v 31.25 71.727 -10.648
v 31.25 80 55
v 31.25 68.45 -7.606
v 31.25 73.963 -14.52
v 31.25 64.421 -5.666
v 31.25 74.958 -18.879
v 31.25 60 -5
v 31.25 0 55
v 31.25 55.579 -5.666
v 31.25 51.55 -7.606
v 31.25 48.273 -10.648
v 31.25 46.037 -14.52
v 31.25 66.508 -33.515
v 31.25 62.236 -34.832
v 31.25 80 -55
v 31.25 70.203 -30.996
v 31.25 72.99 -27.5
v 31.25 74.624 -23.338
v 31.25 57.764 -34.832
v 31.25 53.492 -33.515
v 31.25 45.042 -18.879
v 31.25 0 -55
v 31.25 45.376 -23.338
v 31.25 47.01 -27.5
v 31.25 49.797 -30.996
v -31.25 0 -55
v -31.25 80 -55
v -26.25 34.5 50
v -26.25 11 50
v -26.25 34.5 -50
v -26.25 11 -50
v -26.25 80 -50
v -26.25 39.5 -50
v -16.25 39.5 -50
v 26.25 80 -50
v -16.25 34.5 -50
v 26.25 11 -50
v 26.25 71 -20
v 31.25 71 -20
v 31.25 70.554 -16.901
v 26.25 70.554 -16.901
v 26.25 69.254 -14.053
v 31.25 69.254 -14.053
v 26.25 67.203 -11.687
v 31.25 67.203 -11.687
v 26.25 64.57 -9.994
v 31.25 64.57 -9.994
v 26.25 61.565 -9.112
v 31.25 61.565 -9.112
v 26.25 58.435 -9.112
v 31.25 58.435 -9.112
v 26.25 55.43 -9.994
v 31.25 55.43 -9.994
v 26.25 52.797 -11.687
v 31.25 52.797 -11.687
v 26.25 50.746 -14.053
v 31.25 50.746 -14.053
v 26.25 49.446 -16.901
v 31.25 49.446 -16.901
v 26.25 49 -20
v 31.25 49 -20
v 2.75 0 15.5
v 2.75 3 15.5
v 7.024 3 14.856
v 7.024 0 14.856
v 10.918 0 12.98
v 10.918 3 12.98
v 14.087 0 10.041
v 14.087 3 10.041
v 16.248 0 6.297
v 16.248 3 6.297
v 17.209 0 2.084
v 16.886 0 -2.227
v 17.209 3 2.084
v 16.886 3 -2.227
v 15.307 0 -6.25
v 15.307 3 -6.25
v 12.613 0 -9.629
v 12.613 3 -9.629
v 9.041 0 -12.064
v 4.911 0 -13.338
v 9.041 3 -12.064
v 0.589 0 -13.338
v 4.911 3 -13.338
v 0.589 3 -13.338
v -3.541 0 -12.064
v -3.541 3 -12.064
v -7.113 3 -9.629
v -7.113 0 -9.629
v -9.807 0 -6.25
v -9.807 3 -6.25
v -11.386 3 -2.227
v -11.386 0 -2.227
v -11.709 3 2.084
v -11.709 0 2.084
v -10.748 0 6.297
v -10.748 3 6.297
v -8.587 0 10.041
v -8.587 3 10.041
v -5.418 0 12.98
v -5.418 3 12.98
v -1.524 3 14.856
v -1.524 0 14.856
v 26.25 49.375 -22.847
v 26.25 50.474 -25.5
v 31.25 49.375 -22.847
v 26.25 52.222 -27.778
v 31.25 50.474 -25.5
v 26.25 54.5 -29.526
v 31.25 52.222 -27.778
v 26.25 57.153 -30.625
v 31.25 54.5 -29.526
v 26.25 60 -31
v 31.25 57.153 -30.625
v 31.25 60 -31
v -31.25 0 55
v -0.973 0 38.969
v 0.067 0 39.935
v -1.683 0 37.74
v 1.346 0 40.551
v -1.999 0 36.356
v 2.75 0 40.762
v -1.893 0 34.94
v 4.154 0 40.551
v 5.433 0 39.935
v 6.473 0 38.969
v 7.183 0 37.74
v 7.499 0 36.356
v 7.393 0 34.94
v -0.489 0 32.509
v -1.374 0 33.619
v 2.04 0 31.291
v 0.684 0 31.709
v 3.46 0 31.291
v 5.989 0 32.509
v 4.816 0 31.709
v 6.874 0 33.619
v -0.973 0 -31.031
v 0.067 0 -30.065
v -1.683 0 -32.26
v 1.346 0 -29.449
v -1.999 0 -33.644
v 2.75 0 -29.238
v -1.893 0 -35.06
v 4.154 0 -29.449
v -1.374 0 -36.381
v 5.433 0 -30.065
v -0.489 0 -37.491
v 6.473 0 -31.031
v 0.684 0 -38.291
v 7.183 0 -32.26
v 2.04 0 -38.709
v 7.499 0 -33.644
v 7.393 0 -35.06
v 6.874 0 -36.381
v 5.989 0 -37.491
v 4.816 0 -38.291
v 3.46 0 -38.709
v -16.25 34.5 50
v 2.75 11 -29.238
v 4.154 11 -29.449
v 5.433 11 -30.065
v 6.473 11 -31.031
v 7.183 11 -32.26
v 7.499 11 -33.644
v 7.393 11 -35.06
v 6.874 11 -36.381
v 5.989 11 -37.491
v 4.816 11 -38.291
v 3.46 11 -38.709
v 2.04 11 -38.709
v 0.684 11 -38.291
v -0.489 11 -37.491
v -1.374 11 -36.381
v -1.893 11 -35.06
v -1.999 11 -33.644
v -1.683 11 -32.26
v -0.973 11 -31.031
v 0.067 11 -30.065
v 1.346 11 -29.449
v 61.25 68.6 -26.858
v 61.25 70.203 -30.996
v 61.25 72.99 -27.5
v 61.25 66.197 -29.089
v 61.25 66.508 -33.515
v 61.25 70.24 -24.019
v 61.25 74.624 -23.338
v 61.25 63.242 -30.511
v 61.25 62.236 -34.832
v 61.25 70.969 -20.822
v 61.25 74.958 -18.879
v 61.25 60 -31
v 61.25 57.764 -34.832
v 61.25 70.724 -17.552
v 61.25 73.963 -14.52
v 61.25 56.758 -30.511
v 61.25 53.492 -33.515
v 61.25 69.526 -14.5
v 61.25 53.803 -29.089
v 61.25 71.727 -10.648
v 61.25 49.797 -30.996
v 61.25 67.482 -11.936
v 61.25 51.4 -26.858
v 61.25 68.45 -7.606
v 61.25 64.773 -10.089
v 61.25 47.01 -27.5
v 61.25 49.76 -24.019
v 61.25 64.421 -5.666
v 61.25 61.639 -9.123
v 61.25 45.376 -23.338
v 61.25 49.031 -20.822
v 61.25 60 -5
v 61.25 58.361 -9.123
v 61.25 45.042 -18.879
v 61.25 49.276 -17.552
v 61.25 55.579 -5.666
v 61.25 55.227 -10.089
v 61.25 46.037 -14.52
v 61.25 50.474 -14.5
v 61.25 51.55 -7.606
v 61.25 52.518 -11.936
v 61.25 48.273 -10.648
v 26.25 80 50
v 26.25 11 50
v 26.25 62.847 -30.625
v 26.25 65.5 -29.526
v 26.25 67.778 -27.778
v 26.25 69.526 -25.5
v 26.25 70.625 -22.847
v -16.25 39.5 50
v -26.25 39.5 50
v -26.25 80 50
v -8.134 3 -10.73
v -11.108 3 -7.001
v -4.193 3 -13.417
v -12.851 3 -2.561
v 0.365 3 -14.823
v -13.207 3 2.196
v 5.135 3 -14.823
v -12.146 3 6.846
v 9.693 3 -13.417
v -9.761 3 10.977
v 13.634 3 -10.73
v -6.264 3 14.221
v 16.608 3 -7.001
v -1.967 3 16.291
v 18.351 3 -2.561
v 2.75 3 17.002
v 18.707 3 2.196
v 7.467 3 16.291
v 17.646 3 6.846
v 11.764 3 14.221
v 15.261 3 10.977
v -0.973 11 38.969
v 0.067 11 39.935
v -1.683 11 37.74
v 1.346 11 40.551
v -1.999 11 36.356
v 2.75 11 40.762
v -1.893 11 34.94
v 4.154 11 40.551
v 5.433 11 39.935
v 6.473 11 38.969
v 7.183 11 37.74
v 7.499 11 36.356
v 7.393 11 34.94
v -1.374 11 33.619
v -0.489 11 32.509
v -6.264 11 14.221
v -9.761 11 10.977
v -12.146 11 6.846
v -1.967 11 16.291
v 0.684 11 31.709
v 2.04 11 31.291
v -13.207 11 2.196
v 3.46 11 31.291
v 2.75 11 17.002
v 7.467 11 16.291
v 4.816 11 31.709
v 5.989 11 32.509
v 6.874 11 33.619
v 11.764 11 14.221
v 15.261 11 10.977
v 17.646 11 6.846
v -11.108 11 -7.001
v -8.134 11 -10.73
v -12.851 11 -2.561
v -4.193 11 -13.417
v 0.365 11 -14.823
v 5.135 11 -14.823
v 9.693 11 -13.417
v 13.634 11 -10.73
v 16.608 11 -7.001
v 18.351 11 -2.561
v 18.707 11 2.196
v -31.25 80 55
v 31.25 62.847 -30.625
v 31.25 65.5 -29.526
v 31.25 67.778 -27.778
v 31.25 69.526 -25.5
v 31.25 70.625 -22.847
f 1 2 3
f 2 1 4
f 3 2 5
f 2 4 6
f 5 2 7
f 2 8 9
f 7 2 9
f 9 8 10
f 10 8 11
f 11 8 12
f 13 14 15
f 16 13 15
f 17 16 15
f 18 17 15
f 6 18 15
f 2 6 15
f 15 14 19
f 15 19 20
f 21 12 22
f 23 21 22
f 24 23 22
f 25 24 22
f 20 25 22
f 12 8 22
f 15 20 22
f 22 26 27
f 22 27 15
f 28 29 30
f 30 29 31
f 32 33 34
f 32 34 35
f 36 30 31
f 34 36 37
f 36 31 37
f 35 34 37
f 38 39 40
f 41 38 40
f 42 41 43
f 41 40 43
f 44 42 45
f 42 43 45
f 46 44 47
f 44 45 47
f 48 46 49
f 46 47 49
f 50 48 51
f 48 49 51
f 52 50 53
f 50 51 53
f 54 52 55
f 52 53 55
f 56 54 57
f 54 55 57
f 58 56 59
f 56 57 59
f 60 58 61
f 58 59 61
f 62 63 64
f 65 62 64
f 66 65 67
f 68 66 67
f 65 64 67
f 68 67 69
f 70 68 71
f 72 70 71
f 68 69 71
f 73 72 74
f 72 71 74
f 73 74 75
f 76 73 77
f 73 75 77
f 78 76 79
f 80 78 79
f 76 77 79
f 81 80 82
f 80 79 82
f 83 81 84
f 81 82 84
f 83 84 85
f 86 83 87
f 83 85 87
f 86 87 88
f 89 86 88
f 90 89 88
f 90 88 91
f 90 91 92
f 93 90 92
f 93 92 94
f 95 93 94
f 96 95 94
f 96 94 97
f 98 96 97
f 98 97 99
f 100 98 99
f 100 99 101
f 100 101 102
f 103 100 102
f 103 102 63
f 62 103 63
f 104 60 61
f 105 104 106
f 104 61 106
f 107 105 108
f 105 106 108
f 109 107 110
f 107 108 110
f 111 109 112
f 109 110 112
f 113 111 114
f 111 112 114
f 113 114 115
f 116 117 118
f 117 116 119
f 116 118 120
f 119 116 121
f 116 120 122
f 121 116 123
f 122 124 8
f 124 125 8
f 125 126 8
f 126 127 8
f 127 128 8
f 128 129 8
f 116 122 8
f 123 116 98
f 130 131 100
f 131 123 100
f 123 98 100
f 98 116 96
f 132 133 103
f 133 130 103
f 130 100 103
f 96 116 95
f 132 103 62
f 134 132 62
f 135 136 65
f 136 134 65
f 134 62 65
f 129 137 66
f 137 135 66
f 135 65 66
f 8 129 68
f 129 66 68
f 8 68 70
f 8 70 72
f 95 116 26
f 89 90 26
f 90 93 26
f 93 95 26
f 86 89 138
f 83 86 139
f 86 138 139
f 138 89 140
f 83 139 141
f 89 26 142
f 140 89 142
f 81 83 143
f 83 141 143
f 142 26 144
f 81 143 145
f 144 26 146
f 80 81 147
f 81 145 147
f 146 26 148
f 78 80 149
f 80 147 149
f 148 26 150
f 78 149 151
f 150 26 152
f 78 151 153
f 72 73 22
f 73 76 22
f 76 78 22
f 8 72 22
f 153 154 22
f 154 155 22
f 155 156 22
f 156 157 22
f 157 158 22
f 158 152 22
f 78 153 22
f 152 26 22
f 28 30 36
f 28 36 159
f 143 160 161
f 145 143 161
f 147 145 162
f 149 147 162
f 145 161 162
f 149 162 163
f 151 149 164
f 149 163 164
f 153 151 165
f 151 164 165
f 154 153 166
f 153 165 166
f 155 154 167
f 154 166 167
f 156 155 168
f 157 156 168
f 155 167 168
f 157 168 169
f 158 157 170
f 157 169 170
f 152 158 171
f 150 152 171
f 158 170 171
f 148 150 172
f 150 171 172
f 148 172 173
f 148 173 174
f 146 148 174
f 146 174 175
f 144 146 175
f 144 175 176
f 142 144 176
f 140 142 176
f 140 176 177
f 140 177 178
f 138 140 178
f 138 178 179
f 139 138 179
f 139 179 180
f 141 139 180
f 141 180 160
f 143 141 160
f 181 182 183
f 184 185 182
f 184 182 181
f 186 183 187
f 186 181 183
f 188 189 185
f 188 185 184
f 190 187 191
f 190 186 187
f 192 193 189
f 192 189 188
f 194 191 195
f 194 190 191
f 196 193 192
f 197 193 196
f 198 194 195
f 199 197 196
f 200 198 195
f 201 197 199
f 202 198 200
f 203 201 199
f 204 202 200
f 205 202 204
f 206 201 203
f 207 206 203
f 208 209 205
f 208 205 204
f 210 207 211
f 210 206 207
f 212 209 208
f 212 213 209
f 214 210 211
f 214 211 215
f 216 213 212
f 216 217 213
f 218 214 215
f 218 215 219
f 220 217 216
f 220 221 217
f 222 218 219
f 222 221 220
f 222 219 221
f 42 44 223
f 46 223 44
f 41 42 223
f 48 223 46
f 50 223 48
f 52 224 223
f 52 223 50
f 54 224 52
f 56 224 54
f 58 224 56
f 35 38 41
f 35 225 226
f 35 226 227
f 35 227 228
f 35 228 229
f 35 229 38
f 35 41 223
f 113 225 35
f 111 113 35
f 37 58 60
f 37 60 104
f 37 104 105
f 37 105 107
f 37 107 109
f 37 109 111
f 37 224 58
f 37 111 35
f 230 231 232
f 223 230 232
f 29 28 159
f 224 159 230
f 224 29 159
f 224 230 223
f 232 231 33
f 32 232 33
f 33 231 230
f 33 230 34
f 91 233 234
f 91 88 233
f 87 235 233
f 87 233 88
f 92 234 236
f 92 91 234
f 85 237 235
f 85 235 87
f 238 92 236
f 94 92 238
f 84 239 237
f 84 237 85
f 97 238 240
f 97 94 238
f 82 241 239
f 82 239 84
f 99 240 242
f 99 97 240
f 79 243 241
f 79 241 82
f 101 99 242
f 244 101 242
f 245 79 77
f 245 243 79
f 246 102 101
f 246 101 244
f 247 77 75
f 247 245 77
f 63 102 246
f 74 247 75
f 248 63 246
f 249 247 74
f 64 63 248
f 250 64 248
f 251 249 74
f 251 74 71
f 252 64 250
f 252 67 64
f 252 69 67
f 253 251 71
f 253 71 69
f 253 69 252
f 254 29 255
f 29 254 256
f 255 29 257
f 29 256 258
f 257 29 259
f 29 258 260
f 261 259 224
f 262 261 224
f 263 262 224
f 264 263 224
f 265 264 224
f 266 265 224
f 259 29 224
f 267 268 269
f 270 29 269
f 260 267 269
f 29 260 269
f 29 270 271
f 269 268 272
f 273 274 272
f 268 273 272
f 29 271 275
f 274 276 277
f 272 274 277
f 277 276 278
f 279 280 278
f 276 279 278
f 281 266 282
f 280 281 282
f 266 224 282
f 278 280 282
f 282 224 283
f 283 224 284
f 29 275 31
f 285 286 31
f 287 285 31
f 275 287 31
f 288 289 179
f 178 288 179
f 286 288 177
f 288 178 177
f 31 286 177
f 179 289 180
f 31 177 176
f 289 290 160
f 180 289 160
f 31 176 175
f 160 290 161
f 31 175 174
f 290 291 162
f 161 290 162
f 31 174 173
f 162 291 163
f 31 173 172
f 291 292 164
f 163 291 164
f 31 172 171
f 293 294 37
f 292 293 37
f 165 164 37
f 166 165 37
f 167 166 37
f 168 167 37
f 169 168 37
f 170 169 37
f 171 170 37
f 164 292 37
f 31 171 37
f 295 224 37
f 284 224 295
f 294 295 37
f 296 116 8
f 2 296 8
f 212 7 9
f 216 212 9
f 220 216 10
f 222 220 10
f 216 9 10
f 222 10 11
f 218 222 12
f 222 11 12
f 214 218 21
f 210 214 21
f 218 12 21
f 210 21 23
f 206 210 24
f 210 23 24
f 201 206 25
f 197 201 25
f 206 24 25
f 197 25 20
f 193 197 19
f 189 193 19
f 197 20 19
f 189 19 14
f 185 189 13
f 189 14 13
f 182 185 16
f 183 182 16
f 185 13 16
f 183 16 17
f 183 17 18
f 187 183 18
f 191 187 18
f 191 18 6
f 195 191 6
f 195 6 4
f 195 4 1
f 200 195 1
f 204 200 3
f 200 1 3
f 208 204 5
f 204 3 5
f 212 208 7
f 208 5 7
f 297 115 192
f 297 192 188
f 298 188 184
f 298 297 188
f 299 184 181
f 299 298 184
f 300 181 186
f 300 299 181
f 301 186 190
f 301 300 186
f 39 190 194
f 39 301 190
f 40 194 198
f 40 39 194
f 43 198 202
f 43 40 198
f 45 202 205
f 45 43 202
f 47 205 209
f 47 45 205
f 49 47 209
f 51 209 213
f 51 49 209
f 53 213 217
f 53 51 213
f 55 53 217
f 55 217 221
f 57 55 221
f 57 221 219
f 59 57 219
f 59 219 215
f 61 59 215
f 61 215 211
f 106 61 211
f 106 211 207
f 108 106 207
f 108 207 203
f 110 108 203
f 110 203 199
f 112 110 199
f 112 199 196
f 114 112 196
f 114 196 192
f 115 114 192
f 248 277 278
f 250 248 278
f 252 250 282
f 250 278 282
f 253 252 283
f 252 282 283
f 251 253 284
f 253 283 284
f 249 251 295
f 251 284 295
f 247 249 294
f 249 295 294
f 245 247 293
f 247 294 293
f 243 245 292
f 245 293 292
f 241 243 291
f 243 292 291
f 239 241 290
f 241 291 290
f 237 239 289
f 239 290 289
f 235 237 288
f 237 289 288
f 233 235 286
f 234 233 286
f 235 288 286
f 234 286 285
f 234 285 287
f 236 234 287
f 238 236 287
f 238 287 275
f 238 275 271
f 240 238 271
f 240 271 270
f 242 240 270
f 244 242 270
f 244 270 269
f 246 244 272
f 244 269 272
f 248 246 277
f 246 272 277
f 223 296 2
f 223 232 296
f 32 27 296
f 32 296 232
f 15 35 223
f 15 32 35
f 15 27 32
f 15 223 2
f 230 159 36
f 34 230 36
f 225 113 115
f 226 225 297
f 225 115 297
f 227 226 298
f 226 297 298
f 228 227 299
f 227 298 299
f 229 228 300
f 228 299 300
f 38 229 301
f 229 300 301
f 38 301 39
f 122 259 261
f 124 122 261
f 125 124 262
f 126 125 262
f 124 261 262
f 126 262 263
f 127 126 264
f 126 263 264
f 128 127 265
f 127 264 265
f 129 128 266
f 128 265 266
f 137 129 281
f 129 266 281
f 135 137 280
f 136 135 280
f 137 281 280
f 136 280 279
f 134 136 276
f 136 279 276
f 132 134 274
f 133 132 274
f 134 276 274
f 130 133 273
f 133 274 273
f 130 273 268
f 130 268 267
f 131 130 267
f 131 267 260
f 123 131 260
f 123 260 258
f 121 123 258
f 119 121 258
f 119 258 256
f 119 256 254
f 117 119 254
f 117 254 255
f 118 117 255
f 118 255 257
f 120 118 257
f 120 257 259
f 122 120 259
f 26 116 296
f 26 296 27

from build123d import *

# Parameters (mm, degrees)
SKETCH1_W                 = 62.5
SKETCH1_H                 = 110
BOSS_EXTRUDE1_DEPTH       = 80
SHELL1_T                  = -5
SHELL1_THICKNESS_2_FACE_W = 100
SHELL1_THICKNESS_2_FACE_H = 52.5
SHELL1_THICKNESS_2_DEPTH  = 6
SKETCH2_R                 = 15
SKETCH2_R_2               = 11
BOSS_EXTRUDE2_DEPTH       = 30
CUT_EXTRUDE2_REACH        = 117.461
BOSS_EXTRUDE3_START       = -52.5
BOSS_EXTRUDE3_DEPTH       = 10
CUT_EXTRUDE4_REACH        = 109.413
SKETCH6_R                 = 14.5
SKETCH6_3_R               = 16.002
SKETCH6_3_R_2             = 14.5
CUT_EXTRUDE5_DEPTH        = 8
SKETCH7_R                 = 4.7625
CUT_EXTRUDE6_DEPTH        = 108.413046228


with BuildPart() as part:
    # Sketch1 → Boss-Extrude1 (new body)
    with BuildSketch(Plane(origin=(0, 0, 0), x_dir=(1, 0, 0), z_dir=(0, 1, 0))):
        Rectangle(SKETCH1_W, SKETCH1_H)
    extrude(amount=BOSS_EXTRUDE1_DEPTH)

    # Shell1
    shell1_openings = [part.faces().sort_by_distance(p)[0] for p in [
        (0, 80, 0),
    ]]
    offset(amount=SHELL1_T, openings=shell1_openings, kind=Kind.INTERSECTION)

    # Shell1 thickness 2 face (on inner face of the shell) → Shell1 thickness 2 (add)
    with BuildSketch(Plane(origin=(0, 5, 0), x_dir=(0, 0, -1), z_dir=(0, -1, 0))):
        Rectangle(SHELL1_THICKNESS_2_FACE_W, SHELL1_THICKNESS_2_FACE_H)
    extrude(amount=-SHELL1_THICKNESS_2_DEPTH)

    # Sketch2 → Boss-Extrude2 (add)
    with BuildSketch(Plane(origin=(31.25, 0, 0), x_dir=(0, 0, -1), z_dir=(1, 0, 0))):
        with Locations(Location((20, 60, 0), (0, 0, 180))):
            Circle(SKETCH2_R)
        with Locations((20, 60)):
            Circle(SKETCH2_R_2, mode=Mode.SUBTRACT)
    extrude(amount=BOSS_EXTRUDE2_DEPTH)

    # Sketch2<3> → Cut-Extrude2 (cut, up to next)
    with BuildSketch(Plane(origin=(31.25, 0, 0), x_dir=(0, 0, -1), z_dir=(1, 0, 0)), mode=Mode.PRIVATE) as cut_extrude2_sk1:
        with BuildLine():
            ThreePointArc((31, 60), (27.778174593, 67.778174593), (20, 71))
            Line((20, 71), (20, 49))
            ThreePointArc((20, 49), (27.778174593, 52.221825407), (31, 60))
        make_face()
    cut_extrude2_tool1 = extrude(cut_extrude2_sk1.sketch, amount=-CUT_EXTRUDE2_REACH, mode=Mode.PRIVATE) & part.part
    # Sketch2<3> → Cut-Extrude2 (cut, up to next)
    with BuildSketch(Plane(origin=(31.25, 0, 0), x_dir=(0, 0, -1), z_dir=(1, 0, 0)), mode=Mode.PRIVATE) as cut_extrude2_sk2:
        with BuildLine():
            Line((20, 49), (20, 71))
            ThreePointArc((20, 71), (9, 60), (20, 49))
        make_face()
    cut_extrude2_tool2 = extrude(cut_extrude2_sk2.sketch, amount=-CUT_EXTRUDE2_REACH, mode=Mode.PRIVATE) & part.part
    # Sketch2<3> → Cut-Extrude2 (cut, up to next)
    with BuildSketch(Plane(origin=(31.25, 0, 0), x_dir=(0, 0, -1), z_dir=(1, 0, 0)), mode=Mode.PRIVATE) as cut_extrude2_sk3:
        with BuildLine():
            ThreePointArc((31, 60), (27.778174593, 67.778174593), (20, 71))
            Line((20, 71), (20, 49))
            ThreePointArc((20, 49), (27.778174593, 52.221825407), (31, 60))
        make_face()
    cut_extrude2_tool3 = extrude(cut_extrude2_sk3.sketch, amount=-CUT_EXTRUDE2_REACH, mode=Mode.PRIVATE) & part.part
    # Sketch2<3> → Cut-Extrude2 (cut, up to next)
    with BuildSketch(Plane(origin=(31.25, 0, 0), x_dir=(0, 0, -1), z_dir=(1, 0, 0)), mode=Mode.PRIVATE) as cut_extrude2_sk4:
        with BuildLine():
            Line((20, 49), (20, 71))
            ThreePointArc((20, 71), (9, 60), (20, 49))
        make_face()
    cut_extrude2_tool4 = extrude(cut_extrude2_sk4.sketch, amount=-CUT_EXTRUDE2_REACH, mode=Mode.PRIVATE) & part.part
    add(cut_extrude2_tool1.solids().sort_by_distance((31.25, 60, -24.668545))[0], mode=Mode.SUBTRACT)
    add(cut_extrude2_tool2.solids().sort_by_distance((31.25, 60, -15.331455))[0], mode=Mode.SUBTRACT)
    add(cut_extrude2_tool3.solids().sort_by_distance((31.25, 60, -24.668545))[0], mode=Mode.SUBTRACT)
    add(cut_extrude2_tool4.solids().sort_by_distance((31.25, 60, -15.331455))[0], mode=Mode.SUBTRACT)

    # 3DSketch1 → Boss-Extrude3 (add)
    with BuildSketch(Plane(origin=(26.25, 39.5, -50), x_dir=(0, -0.04993761694389221, 0.9987523388778448), z_dir=(1, 0, 0)).offset(BOSS_EXTRUDE3_START)):
        Polygon((0, 0), (0.249688085, 4.993761694), (100.124921973, 0), (99.875233888, -4.993761694), align=None)
    extrude(amount=BOSS_EXTRUDE3_DEPTH)

    # Sketch6 → Cut-Extrude4 (cut, up to next)
    with BuildSketch(Plane(origin=(0, 11, 0), x_dir=(1, 0, 0), z_dir=(0, 1, 0)), mode=Mode.PRIVATE) as cut_extrude4_sk1:
        with Locations(Location((2.75, -1, 0), (0, 0, 270))):
            Circle(SKETCH6_R)
    cut_extrude4_tool1 = extrude(cut_extrude4_sk1.sketch, amount=-CUT_EXTRUDE4_REACH, mode=Mode.PRIVATE) & part.part
    add(cut_extrude4_tool1.solids().sort_by_distance((2.75, 11, 1))[0], mode=Mode.SUBTRACT)

    # Sketch6<3> → Cut-Extrude5 (cut)
    with BuildSketch(Plane(origin=(0, 11, 0), x_dir=(1, 0, 0), z_dir=(0, 1, 0))):
        with Locations(Location((2.75, -1, 0), (0, 0, 270))):
            Circle(SKETCH6_3_R)
        with Locations(Location((2.75, -1, 0), (0, 0, 270))):
            Circle(SKETCH6_3_R_2, mode=Mode.SUBTRACT)
    extrude(amount=-CUT_EXTRUDE5_DEPTH, mode=Mode.SUBTRACT)

    # Sketch7 → Cut-Extrude6 (cut, through all)
    with BuildSketch(Plane(origin=(0, 11, 0), x_dir=(1, 0, 0), z_dir=(0, 1, 0))):
        with Locations(Location((2.75, -36, 0), (0, 0, 270))):
            Circle(SKETCH7_R)
        with Locations(Location((2.75, 34, 0), (0, 0, 270))):
            Circle(SKETCH7_R)
    extrude(amount=-CUT_EXTRUDE6_DEPTH, mode=Mode.SUBTRACT)


solid = part.part
